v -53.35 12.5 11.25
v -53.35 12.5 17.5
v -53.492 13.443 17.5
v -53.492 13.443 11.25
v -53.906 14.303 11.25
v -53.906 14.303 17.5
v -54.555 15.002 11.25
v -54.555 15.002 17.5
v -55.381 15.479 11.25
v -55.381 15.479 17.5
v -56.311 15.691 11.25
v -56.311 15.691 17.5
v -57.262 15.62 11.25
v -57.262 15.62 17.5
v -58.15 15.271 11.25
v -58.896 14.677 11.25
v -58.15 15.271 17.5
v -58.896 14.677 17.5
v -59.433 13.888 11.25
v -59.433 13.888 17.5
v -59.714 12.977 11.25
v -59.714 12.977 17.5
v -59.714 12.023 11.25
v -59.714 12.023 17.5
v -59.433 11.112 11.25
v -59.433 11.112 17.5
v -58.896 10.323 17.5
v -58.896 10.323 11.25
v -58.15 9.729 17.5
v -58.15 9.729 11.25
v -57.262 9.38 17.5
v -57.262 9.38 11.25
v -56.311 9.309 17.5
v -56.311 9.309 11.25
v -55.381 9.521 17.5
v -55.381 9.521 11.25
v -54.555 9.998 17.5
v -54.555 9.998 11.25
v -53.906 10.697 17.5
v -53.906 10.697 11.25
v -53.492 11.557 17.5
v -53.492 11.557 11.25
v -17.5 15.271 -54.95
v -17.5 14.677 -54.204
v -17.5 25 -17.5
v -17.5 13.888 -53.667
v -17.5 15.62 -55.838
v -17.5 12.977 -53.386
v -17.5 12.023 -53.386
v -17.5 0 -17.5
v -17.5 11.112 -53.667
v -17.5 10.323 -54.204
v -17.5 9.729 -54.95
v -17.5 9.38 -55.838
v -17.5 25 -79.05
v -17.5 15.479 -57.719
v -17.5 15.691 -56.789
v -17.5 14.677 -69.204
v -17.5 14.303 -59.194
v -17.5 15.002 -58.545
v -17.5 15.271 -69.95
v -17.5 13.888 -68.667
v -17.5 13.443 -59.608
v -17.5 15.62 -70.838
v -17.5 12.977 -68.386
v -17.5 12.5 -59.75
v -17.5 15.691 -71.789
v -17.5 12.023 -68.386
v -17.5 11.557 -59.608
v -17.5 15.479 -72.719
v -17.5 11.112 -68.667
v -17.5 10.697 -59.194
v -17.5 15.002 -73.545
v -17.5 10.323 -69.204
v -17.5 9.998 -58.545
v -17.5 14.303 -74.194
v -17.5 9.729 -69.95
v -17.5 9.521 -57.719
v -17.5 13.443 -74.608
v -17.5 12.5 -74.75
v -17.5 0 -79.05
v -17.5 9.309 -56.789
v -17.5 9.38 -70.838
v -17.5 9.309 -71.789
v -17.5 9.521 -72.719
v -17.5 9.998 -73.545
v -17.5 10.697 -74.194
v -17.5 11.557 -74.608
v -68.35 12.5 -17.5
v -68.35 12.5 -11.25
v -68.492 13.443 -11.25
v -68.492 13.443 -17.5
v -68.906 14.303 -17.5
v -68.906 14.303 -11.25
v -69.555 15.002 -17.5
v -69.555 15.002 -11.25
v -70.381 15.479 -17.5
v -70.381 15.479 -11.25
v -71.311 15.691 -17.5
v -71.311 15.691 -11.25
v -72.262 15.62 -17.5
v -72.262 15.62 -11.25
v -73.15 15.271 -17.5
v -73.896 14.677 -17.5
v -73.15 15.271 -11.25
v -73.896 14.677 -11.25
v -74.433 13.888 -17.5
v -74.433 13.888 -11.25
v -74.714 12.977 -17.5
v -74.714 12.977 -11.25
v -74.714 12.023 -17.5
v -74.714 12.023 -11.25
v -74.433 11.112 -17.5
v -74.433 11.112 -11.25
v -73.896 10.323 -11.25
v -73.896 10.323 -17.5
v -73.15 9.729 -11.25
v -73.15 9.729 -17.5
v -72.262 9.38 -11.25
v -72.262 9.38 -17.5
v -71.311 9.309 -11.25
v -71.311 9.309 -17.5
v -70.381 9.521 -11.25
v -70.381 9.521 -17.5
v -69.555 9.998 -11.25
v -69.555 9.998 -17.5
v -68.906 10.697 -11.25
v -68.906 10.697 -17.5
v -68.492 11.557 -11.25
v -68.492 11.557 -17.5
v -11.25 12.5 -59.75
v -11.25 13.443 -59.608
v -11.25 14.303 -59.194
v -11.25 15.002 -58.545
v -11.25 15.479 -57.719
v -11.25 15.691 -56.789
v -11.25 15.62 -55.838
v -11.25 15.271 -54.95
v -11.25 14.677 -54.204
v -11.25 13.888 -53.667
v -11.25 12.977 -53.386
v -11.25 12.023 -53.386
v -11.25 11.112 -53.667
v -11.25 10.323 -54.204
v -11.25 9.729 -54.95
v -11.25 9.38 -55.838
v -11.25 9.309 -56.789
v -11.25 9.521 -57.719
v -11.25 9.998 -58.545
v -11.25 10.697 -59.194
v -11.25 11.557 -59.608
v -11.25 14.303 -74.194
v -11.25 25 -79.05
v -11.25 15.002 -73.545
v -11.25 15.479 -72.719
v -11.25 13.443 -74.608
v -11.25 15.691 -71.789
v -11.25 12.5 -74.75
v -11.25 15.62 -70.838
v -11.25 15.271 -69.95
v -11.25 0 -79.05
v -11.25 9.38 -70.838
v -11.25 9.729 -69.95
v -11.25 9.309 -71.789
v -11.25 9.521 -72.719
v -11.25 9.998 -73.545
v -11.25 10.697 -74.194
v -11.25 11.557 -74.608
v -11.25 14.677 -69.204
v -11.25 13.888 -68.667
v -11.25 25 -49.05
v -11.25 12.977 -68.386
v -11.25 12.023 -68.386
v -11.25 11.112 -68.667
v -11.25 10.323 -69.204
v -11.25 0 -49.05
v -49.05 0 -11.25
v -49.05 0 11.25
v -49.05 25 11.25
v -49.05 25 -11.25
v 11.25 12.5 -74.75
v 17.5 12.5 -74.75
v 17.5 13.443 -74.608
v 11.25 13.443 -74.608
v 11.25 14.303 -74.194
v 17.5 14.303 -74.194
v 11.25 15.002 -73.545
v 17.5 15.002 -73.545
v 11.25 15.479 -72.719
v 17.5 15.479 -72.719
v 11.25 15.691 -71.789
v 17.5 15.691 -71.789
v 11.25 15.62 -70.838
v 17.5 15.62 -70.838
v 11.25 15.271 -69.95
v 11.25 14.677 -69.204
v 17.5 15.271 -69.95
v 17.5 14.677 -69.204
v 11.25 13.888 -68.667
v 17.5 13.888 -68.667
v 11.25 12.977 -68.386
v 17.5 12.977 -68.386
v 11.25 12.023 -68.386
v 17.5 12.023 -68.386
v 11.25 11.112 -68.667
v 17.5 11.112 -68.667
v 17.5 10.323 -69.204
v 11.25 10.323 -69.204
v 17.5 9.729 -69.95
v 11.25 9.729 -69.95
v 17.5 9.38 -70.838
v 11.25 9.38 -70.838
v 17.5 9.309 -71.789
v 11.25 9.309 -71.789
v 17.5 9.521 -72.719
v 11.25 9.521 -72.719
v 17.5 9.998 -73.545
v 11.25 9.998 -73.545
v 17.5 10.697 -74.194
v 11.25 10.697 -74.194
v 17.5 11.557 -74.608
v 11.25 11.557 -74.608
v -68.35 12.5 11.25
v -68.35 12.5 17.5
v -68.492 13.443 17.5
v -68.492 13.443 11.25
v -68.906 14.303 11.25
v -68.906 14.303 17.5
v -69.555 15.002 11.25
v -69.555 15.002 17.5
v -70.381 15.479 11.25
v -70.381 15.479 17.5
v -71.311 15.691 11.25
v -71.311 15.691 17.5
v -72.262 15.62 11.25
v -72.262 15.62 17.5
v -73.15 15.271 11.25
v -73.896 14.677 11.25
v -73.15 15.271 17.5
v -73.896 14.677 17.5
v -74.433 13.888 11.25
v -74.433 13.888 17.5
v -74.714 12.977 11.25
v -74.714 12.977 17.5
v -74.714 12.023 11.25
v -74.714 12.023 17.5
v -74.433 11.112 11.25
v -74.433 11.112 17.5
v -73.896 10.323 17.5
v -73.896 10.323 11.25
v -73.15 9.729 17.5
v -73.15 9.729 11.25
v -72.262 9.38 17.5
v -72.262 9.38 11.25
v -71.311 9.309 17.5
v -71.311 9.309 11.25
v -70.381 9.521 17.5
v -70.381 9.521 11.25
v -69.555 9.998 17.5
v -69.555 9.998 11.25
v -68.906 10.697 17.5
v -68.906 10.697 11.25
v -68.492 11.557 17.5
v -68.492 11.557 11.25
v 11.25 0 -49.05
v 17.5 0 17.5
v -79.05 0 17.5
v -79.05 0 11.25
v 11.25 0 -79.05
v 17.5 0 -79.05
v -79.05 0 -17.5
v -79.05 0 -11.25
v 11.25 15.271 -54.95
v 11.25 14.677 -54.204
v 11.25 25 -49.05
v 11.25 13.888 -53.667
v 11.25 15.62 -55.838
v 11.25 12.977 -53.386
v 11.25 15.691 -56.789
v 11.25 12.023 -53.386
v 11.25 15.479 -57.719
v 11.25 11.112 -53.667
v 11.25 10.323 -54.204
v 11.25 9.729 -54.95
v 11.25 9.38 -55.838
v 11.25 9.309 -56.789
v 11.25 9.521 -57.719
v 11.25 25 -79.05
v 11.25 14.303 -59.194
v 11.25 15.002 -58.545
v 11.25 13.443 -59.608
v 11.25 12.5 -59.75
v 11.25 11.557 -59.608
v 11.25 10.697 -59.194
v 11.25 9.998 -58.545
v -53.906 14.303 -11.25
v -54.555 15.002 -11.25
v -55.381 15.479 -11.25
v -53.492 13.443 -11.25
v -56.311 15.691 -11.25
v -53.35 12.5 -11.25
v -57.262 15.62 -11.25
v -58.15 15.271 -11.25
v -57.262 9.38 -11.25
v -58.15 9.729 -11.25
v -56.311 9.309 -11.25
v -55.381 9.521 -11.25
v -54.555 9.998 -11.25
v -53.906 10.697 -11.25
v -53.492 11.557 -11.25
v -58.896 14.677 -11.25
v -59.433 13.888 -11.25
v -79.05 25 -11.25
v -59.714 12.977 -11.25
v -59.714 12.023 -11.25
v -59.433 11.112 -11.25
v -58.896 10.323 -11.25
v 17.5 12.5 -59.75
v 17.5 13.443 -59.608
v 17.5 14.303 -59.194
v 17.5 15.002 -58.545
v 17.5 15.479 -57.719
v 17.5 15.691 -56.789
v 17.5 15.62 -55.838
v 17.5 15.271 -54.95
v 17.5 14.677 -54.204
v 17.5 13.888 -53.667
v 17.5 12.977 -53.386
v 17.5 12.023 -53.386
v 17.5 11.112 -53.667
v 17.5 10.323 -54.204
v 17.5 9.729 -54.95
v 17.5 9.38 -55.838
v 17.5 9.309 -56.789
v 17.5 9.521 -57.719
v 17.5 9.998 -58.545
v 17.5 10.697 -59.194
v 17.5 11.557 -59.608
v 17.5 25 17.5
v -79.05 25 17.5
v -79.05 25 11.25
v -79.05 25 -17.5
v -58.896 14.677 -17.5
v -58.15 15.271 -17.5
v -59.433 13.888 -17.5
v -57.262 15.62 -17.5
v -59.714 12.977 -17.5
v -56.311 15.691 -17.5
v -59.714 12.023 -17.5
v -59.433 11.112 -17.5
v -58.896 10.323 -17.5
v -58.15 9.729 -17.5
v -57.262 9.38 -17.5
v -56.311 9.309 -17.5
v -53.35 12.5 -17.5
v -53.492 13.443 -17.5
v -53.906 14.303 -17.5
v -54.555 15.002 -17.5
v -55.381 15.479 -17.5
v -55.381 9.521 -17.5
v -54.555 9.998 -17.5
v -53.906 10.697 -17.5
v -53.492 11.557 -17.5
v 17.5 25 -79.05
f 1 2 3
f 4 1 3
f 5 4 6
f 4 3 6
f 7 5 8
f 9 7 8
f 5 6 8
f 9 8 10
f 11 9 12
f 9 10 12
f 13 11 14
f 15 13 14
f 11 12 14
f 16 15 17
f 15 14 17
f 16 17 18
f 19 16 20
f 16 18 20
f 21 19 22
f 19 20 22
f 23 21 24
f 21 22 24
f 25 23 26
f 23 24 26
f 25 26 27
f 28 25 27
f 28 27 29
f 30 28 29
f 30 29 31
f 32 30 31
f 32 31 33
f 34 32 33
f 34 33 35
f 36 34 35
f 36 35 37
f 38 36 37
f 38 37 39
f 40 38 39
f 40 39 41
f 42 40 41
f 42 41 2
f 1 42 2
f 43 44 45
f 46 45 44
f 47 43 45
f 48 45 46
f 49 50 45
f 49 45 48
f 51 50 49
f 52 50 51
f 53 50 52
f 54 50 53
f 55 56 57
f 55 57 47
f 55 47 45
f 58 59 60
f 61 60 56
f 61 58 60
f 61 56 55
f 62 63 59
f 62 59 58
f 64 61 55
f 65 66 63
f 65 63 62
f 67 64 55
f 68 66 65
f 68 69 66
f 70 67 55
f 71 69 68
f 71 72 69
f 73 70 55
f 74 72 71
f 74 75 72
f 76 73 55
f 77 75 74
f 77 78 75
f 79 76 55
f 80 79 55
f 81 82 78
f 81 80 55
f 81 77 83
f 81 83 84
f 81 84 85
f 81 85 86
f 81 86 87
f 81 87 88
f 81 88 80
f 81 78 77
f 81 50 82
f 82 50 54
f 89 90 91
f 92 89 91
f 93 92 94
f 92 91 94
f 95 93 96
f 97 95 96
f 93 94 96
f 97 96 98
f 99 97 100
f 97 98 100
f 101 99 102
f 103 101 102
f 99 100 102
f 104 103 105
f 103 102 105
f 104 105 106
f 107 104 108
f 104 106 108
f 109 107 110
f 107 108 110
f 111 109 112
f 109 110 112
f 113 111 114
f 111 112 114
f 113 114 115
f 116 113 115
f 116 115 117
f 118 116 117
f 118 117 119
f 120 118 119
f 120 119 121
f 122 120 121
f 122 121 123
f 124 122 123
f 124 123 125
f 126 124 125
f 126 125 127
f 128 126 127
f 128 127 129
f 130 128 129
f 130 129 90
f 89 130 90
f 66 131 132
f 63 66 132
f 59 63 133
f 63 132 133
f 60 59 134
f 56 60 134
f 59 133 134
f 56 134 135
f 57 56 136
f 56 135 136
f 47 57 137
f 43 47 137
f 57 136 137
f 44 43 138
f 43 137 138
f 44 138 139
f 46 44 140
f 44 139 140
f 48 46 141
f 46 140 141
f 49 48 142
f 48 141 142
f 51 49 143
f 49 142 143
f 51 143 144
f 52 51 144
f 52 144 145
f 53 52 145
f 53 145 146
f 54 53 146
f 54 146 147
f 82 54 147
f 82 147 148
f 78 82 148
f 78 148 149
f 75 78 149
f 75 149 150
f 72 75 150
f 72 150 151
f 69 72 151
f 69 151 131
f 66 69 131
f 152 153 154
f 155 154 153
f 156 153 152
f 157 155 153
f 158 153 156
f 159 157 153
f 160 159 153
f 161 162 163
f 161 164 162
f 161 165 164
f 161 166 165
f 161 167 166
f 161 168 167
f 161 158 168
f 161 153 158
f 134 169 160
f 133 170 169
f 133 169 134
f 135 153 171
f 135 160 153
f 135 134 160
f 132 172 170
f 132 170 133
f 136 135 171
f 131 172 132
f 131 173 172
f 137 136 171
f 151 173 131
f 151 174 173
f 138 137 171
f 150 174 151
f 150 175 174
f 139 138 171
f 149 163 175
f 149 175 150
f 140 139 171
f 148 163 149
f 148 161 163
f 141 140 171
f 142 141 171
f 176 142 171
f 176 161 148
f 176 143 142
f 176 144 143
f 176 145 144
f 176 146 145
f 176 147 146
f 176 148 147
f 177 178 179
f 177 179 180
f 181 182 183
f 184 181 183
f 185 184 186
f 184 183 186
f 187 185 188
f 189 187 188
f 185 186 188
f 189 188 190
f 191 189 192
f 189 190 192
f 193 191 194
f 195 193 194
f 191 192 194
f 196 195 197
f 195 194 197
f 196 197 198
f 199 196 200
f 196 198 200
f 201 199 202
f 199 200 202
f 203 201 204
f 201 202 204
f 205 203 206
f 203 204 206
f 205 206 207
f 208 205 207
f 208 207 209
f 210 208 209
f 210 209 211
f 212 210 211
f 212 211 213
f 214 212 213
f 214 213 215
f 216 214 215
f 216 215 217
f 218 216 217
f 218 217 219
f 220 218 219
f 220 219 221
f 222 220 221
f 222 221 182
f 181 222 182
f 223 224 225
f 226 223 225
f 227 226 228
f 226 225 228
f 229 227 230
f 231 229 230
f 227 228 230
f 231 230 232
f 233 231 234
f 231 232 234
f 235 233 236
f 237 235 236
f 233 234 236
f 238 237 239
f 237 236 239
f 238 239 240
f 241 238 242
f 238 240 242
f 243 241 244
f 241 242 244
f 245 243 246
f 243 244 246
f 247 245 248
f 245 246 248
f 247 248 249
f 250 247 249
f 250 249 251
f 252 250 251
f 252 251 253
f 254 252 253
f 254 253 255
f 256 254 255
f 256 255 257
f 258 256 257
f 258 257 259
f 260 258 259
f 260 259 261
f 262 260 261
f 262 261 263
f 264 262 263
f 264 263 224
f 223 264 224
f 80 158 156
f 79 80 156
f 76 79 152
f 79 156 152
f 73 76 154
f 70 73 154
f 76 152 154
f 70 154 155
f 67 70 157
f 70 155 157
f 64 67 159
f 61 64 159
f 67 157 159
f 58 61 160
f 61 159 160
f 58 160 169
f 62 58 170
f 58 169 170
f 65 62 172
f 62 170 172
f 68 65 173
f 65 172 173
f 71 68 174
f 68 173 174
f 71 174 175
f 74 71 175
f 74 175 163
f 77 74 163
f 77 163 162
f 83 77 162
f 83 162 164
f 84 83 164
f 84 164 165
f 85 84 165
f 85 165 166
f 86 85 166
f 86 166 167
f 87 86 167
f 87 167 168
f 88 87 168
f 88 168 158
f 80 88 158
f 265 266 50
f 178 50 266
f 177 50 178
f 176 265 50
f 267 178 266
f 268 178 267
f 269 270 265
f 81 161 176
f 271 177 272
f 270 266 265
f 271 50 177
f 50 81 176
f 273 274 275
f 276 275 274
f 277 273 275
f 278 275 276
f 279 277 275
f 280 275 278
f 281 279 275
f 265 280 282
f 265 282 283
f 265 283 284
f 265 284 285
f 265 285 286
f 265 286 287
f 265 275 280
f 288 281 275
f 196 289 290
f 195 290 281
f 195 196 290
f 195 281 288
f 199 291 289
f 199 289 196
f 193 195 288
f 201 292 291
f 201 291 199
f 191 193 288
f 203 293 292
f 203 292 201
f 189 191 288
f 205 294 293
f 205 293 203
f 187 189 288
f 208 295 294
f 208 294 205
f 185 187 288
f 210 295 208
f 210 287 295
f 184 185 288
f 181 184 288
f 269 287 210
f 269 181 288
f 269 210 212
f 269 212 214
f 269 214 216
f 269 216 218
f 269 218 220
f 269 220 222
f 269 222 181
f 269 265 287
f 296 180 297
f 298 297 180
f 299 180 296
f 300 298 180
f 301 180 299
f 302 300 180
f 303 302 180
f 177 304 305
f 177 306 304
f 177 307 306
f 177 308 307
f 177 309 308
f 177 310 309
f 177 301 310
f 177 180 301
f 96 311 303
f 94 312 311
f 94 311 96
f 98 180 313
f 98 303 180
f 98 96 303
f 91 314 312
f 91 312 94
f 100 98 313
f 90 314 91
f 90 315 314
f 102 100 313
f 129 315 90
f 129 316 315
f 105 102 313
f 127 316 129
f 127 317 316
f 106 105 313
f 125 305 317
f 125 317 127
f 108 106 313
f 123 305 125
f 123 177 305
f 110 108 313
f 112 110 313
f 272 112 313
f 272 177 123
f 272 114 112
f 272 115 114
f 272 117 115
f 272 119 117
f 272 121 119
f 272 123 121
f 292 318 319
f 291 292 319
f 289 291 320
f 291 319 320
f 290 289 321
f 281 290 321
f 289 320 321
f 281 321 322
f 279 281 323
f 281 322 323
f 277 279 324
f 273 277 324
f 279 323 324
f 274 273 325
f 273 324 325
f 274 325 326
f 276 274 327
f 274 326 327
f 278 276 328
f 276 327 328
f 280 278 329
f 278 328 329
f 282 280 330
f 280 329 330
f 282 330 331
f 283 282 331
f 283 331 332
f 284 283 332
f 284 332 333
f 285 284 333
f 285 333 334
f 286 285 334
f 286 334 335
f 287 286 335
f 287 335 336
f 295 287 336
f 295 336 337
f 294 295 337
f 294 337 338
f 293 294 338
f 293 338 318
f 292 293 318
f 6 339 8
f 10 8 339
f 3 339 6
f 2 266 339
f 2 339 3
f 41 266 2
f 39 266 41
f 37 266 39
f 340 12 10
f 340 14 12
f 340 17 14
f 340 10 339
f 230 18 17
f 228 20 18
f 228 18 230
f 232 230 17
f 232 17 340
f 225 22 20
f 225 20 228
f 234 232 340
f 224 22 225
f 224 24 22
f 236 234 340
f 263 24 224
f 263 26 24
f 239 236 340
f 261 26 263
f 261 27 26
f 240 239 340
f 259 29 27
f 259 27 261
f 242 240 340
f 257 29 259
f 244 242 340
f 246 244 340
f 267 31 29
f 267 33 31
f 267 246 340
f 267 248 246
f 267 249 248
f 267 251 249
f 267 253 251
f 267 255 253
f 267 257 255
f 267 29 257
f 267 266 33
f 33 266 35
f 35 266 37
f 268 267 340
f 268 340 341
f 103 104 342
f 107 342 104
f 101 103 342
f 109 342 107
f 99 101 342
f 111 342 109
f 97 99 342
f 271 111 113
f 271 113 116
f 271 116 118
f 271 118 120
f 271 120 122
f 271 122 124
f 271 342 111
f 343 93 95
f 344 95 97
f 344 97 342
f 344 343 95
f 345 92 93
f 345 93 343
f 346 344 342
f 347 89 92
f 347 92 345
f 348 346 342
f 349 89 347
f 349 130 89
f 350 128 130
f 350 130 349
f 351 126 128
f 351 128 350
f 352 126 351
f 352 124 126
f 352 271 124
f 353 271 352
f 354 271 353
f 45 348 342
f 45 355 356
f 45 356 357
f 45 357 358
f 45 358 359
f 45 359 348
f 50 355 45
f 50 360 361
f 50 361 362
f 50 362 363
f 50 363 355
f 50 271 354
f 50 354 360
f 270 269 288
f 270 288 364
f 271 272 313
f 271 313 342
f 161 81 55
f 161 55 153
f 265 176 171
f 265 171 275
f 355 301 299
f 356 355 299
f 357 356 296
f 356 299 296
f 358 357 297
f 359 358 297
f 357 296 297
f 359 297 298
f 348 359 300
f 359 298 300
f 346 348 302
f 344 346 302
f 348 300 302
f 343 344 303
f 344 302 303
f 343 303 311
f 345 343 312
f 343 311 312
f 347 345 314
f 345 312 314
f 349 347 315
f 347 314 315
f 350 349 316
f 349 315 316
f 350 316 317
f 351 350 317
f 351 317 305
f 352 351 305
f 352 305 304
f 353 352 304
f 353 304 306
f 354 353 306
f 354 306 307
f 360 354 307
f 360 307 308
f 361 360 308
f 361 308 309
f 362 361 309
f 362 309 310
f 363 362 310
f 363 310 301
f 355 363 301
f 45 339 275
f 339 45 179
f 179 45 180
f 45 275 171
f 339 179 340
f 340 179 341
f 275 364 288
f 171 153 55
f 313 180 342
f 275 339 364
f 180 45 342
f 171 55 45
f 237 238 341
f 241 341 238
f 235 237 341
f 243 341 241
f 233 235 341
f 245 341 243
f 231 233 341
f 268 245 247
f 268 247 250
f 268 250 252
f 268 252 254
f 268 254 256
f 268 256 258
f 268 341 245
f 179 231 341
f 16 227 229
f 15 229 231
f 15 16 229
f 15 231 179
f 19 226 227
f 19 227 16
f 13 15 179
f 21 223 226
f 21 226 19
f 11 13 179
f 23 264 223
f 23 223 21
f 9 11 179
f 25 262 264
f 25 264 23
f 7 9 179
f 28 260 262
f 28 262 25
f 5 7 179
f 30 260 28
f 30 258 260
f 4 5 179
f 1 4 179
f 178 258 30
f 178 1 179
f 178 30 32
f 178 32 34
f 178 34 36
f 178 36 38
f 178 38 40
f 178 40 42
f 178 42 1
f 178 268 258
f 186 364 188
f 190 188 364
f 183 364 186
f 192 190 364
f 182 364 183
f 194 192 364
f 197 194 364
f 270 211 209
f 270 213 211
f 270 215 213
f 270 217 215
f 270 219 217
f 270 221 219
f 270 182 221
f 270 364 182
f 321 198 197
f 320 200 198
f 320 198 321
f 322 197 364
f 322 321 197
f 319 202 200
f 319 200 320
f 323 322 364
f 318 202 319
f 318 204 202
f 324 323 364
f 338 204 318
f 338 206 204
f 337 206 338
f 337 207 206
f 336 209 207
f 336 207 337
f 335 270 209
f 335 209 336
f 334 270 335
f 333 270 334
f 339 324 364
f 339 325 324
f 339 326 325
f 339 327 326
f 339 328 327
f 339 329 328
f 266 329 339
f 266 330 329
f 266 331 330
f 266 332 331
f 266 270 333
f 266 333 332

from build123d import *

# Parameters (mm, degrees)
EXTRUDE_1_DEPTH     = 25
SKETCH_2_R          = 3.2
CUT_EXTRUDE_1_DEPTH = 35
SKETCH_3_R          = 3.2
CUT_EXTRUDE_2_DEPTH = 35


with BuildPart() as part:
    # 스케치1 → 보스-돌출1 (new body)
    with BuildSketch(Plane(origin=(0, 0, 0), x_dir=(1, 0, 0), z_dir=(0, 1, 0))):
        Polygon((-17.5, 79.05), (-11.25, 79.05), (-11.25, 49.05), (11.25, 49.05), (11.25, 79.05), (17.5, 79.05), (17.5, -17.5), (-79.05, -17.5), (-79.05, -11.25), (-49.05, -11.25), (-49.05, 11.25), (-79.05, 11.25), (-79.05, 17.5), (-17.5, 17.5), align=None)
    extrude(amount=EXTRUDE_1_DEPTH)

    # 스케치2 → 컷-돌출1 (cut)
    with BuildSketch(Plane(origin=(17.5, 0, 0), x_dir=(0, 0, -1), z_dir=(1, 0, 0))):
        with Locations((71.55, 12.5)):
            Circle(SKETCH_2_R)
        with Locations((56.55, 12.5)):
            Circle(SKETCH_2_R)
    extrude(amount=-CUT_EXTRUDE_1_DEPTH, mode=Mode.SUBTRACT)

    # 스케치3 → 컷-돌출2 (cut)
    with BuildSketch(Plane.XY.offset(17.5)):
        with Locations((-71.55, 12.5)):
            Circle(SKETCH_3_R)
        with Locations((-56.55, 12.5)):
            Circle(SKETCH_3_R)
    extrude(amount=-CUT_EXTRUDE_2_DEPTH, mode=Mode.SUBTRACT)


solid = part.part
